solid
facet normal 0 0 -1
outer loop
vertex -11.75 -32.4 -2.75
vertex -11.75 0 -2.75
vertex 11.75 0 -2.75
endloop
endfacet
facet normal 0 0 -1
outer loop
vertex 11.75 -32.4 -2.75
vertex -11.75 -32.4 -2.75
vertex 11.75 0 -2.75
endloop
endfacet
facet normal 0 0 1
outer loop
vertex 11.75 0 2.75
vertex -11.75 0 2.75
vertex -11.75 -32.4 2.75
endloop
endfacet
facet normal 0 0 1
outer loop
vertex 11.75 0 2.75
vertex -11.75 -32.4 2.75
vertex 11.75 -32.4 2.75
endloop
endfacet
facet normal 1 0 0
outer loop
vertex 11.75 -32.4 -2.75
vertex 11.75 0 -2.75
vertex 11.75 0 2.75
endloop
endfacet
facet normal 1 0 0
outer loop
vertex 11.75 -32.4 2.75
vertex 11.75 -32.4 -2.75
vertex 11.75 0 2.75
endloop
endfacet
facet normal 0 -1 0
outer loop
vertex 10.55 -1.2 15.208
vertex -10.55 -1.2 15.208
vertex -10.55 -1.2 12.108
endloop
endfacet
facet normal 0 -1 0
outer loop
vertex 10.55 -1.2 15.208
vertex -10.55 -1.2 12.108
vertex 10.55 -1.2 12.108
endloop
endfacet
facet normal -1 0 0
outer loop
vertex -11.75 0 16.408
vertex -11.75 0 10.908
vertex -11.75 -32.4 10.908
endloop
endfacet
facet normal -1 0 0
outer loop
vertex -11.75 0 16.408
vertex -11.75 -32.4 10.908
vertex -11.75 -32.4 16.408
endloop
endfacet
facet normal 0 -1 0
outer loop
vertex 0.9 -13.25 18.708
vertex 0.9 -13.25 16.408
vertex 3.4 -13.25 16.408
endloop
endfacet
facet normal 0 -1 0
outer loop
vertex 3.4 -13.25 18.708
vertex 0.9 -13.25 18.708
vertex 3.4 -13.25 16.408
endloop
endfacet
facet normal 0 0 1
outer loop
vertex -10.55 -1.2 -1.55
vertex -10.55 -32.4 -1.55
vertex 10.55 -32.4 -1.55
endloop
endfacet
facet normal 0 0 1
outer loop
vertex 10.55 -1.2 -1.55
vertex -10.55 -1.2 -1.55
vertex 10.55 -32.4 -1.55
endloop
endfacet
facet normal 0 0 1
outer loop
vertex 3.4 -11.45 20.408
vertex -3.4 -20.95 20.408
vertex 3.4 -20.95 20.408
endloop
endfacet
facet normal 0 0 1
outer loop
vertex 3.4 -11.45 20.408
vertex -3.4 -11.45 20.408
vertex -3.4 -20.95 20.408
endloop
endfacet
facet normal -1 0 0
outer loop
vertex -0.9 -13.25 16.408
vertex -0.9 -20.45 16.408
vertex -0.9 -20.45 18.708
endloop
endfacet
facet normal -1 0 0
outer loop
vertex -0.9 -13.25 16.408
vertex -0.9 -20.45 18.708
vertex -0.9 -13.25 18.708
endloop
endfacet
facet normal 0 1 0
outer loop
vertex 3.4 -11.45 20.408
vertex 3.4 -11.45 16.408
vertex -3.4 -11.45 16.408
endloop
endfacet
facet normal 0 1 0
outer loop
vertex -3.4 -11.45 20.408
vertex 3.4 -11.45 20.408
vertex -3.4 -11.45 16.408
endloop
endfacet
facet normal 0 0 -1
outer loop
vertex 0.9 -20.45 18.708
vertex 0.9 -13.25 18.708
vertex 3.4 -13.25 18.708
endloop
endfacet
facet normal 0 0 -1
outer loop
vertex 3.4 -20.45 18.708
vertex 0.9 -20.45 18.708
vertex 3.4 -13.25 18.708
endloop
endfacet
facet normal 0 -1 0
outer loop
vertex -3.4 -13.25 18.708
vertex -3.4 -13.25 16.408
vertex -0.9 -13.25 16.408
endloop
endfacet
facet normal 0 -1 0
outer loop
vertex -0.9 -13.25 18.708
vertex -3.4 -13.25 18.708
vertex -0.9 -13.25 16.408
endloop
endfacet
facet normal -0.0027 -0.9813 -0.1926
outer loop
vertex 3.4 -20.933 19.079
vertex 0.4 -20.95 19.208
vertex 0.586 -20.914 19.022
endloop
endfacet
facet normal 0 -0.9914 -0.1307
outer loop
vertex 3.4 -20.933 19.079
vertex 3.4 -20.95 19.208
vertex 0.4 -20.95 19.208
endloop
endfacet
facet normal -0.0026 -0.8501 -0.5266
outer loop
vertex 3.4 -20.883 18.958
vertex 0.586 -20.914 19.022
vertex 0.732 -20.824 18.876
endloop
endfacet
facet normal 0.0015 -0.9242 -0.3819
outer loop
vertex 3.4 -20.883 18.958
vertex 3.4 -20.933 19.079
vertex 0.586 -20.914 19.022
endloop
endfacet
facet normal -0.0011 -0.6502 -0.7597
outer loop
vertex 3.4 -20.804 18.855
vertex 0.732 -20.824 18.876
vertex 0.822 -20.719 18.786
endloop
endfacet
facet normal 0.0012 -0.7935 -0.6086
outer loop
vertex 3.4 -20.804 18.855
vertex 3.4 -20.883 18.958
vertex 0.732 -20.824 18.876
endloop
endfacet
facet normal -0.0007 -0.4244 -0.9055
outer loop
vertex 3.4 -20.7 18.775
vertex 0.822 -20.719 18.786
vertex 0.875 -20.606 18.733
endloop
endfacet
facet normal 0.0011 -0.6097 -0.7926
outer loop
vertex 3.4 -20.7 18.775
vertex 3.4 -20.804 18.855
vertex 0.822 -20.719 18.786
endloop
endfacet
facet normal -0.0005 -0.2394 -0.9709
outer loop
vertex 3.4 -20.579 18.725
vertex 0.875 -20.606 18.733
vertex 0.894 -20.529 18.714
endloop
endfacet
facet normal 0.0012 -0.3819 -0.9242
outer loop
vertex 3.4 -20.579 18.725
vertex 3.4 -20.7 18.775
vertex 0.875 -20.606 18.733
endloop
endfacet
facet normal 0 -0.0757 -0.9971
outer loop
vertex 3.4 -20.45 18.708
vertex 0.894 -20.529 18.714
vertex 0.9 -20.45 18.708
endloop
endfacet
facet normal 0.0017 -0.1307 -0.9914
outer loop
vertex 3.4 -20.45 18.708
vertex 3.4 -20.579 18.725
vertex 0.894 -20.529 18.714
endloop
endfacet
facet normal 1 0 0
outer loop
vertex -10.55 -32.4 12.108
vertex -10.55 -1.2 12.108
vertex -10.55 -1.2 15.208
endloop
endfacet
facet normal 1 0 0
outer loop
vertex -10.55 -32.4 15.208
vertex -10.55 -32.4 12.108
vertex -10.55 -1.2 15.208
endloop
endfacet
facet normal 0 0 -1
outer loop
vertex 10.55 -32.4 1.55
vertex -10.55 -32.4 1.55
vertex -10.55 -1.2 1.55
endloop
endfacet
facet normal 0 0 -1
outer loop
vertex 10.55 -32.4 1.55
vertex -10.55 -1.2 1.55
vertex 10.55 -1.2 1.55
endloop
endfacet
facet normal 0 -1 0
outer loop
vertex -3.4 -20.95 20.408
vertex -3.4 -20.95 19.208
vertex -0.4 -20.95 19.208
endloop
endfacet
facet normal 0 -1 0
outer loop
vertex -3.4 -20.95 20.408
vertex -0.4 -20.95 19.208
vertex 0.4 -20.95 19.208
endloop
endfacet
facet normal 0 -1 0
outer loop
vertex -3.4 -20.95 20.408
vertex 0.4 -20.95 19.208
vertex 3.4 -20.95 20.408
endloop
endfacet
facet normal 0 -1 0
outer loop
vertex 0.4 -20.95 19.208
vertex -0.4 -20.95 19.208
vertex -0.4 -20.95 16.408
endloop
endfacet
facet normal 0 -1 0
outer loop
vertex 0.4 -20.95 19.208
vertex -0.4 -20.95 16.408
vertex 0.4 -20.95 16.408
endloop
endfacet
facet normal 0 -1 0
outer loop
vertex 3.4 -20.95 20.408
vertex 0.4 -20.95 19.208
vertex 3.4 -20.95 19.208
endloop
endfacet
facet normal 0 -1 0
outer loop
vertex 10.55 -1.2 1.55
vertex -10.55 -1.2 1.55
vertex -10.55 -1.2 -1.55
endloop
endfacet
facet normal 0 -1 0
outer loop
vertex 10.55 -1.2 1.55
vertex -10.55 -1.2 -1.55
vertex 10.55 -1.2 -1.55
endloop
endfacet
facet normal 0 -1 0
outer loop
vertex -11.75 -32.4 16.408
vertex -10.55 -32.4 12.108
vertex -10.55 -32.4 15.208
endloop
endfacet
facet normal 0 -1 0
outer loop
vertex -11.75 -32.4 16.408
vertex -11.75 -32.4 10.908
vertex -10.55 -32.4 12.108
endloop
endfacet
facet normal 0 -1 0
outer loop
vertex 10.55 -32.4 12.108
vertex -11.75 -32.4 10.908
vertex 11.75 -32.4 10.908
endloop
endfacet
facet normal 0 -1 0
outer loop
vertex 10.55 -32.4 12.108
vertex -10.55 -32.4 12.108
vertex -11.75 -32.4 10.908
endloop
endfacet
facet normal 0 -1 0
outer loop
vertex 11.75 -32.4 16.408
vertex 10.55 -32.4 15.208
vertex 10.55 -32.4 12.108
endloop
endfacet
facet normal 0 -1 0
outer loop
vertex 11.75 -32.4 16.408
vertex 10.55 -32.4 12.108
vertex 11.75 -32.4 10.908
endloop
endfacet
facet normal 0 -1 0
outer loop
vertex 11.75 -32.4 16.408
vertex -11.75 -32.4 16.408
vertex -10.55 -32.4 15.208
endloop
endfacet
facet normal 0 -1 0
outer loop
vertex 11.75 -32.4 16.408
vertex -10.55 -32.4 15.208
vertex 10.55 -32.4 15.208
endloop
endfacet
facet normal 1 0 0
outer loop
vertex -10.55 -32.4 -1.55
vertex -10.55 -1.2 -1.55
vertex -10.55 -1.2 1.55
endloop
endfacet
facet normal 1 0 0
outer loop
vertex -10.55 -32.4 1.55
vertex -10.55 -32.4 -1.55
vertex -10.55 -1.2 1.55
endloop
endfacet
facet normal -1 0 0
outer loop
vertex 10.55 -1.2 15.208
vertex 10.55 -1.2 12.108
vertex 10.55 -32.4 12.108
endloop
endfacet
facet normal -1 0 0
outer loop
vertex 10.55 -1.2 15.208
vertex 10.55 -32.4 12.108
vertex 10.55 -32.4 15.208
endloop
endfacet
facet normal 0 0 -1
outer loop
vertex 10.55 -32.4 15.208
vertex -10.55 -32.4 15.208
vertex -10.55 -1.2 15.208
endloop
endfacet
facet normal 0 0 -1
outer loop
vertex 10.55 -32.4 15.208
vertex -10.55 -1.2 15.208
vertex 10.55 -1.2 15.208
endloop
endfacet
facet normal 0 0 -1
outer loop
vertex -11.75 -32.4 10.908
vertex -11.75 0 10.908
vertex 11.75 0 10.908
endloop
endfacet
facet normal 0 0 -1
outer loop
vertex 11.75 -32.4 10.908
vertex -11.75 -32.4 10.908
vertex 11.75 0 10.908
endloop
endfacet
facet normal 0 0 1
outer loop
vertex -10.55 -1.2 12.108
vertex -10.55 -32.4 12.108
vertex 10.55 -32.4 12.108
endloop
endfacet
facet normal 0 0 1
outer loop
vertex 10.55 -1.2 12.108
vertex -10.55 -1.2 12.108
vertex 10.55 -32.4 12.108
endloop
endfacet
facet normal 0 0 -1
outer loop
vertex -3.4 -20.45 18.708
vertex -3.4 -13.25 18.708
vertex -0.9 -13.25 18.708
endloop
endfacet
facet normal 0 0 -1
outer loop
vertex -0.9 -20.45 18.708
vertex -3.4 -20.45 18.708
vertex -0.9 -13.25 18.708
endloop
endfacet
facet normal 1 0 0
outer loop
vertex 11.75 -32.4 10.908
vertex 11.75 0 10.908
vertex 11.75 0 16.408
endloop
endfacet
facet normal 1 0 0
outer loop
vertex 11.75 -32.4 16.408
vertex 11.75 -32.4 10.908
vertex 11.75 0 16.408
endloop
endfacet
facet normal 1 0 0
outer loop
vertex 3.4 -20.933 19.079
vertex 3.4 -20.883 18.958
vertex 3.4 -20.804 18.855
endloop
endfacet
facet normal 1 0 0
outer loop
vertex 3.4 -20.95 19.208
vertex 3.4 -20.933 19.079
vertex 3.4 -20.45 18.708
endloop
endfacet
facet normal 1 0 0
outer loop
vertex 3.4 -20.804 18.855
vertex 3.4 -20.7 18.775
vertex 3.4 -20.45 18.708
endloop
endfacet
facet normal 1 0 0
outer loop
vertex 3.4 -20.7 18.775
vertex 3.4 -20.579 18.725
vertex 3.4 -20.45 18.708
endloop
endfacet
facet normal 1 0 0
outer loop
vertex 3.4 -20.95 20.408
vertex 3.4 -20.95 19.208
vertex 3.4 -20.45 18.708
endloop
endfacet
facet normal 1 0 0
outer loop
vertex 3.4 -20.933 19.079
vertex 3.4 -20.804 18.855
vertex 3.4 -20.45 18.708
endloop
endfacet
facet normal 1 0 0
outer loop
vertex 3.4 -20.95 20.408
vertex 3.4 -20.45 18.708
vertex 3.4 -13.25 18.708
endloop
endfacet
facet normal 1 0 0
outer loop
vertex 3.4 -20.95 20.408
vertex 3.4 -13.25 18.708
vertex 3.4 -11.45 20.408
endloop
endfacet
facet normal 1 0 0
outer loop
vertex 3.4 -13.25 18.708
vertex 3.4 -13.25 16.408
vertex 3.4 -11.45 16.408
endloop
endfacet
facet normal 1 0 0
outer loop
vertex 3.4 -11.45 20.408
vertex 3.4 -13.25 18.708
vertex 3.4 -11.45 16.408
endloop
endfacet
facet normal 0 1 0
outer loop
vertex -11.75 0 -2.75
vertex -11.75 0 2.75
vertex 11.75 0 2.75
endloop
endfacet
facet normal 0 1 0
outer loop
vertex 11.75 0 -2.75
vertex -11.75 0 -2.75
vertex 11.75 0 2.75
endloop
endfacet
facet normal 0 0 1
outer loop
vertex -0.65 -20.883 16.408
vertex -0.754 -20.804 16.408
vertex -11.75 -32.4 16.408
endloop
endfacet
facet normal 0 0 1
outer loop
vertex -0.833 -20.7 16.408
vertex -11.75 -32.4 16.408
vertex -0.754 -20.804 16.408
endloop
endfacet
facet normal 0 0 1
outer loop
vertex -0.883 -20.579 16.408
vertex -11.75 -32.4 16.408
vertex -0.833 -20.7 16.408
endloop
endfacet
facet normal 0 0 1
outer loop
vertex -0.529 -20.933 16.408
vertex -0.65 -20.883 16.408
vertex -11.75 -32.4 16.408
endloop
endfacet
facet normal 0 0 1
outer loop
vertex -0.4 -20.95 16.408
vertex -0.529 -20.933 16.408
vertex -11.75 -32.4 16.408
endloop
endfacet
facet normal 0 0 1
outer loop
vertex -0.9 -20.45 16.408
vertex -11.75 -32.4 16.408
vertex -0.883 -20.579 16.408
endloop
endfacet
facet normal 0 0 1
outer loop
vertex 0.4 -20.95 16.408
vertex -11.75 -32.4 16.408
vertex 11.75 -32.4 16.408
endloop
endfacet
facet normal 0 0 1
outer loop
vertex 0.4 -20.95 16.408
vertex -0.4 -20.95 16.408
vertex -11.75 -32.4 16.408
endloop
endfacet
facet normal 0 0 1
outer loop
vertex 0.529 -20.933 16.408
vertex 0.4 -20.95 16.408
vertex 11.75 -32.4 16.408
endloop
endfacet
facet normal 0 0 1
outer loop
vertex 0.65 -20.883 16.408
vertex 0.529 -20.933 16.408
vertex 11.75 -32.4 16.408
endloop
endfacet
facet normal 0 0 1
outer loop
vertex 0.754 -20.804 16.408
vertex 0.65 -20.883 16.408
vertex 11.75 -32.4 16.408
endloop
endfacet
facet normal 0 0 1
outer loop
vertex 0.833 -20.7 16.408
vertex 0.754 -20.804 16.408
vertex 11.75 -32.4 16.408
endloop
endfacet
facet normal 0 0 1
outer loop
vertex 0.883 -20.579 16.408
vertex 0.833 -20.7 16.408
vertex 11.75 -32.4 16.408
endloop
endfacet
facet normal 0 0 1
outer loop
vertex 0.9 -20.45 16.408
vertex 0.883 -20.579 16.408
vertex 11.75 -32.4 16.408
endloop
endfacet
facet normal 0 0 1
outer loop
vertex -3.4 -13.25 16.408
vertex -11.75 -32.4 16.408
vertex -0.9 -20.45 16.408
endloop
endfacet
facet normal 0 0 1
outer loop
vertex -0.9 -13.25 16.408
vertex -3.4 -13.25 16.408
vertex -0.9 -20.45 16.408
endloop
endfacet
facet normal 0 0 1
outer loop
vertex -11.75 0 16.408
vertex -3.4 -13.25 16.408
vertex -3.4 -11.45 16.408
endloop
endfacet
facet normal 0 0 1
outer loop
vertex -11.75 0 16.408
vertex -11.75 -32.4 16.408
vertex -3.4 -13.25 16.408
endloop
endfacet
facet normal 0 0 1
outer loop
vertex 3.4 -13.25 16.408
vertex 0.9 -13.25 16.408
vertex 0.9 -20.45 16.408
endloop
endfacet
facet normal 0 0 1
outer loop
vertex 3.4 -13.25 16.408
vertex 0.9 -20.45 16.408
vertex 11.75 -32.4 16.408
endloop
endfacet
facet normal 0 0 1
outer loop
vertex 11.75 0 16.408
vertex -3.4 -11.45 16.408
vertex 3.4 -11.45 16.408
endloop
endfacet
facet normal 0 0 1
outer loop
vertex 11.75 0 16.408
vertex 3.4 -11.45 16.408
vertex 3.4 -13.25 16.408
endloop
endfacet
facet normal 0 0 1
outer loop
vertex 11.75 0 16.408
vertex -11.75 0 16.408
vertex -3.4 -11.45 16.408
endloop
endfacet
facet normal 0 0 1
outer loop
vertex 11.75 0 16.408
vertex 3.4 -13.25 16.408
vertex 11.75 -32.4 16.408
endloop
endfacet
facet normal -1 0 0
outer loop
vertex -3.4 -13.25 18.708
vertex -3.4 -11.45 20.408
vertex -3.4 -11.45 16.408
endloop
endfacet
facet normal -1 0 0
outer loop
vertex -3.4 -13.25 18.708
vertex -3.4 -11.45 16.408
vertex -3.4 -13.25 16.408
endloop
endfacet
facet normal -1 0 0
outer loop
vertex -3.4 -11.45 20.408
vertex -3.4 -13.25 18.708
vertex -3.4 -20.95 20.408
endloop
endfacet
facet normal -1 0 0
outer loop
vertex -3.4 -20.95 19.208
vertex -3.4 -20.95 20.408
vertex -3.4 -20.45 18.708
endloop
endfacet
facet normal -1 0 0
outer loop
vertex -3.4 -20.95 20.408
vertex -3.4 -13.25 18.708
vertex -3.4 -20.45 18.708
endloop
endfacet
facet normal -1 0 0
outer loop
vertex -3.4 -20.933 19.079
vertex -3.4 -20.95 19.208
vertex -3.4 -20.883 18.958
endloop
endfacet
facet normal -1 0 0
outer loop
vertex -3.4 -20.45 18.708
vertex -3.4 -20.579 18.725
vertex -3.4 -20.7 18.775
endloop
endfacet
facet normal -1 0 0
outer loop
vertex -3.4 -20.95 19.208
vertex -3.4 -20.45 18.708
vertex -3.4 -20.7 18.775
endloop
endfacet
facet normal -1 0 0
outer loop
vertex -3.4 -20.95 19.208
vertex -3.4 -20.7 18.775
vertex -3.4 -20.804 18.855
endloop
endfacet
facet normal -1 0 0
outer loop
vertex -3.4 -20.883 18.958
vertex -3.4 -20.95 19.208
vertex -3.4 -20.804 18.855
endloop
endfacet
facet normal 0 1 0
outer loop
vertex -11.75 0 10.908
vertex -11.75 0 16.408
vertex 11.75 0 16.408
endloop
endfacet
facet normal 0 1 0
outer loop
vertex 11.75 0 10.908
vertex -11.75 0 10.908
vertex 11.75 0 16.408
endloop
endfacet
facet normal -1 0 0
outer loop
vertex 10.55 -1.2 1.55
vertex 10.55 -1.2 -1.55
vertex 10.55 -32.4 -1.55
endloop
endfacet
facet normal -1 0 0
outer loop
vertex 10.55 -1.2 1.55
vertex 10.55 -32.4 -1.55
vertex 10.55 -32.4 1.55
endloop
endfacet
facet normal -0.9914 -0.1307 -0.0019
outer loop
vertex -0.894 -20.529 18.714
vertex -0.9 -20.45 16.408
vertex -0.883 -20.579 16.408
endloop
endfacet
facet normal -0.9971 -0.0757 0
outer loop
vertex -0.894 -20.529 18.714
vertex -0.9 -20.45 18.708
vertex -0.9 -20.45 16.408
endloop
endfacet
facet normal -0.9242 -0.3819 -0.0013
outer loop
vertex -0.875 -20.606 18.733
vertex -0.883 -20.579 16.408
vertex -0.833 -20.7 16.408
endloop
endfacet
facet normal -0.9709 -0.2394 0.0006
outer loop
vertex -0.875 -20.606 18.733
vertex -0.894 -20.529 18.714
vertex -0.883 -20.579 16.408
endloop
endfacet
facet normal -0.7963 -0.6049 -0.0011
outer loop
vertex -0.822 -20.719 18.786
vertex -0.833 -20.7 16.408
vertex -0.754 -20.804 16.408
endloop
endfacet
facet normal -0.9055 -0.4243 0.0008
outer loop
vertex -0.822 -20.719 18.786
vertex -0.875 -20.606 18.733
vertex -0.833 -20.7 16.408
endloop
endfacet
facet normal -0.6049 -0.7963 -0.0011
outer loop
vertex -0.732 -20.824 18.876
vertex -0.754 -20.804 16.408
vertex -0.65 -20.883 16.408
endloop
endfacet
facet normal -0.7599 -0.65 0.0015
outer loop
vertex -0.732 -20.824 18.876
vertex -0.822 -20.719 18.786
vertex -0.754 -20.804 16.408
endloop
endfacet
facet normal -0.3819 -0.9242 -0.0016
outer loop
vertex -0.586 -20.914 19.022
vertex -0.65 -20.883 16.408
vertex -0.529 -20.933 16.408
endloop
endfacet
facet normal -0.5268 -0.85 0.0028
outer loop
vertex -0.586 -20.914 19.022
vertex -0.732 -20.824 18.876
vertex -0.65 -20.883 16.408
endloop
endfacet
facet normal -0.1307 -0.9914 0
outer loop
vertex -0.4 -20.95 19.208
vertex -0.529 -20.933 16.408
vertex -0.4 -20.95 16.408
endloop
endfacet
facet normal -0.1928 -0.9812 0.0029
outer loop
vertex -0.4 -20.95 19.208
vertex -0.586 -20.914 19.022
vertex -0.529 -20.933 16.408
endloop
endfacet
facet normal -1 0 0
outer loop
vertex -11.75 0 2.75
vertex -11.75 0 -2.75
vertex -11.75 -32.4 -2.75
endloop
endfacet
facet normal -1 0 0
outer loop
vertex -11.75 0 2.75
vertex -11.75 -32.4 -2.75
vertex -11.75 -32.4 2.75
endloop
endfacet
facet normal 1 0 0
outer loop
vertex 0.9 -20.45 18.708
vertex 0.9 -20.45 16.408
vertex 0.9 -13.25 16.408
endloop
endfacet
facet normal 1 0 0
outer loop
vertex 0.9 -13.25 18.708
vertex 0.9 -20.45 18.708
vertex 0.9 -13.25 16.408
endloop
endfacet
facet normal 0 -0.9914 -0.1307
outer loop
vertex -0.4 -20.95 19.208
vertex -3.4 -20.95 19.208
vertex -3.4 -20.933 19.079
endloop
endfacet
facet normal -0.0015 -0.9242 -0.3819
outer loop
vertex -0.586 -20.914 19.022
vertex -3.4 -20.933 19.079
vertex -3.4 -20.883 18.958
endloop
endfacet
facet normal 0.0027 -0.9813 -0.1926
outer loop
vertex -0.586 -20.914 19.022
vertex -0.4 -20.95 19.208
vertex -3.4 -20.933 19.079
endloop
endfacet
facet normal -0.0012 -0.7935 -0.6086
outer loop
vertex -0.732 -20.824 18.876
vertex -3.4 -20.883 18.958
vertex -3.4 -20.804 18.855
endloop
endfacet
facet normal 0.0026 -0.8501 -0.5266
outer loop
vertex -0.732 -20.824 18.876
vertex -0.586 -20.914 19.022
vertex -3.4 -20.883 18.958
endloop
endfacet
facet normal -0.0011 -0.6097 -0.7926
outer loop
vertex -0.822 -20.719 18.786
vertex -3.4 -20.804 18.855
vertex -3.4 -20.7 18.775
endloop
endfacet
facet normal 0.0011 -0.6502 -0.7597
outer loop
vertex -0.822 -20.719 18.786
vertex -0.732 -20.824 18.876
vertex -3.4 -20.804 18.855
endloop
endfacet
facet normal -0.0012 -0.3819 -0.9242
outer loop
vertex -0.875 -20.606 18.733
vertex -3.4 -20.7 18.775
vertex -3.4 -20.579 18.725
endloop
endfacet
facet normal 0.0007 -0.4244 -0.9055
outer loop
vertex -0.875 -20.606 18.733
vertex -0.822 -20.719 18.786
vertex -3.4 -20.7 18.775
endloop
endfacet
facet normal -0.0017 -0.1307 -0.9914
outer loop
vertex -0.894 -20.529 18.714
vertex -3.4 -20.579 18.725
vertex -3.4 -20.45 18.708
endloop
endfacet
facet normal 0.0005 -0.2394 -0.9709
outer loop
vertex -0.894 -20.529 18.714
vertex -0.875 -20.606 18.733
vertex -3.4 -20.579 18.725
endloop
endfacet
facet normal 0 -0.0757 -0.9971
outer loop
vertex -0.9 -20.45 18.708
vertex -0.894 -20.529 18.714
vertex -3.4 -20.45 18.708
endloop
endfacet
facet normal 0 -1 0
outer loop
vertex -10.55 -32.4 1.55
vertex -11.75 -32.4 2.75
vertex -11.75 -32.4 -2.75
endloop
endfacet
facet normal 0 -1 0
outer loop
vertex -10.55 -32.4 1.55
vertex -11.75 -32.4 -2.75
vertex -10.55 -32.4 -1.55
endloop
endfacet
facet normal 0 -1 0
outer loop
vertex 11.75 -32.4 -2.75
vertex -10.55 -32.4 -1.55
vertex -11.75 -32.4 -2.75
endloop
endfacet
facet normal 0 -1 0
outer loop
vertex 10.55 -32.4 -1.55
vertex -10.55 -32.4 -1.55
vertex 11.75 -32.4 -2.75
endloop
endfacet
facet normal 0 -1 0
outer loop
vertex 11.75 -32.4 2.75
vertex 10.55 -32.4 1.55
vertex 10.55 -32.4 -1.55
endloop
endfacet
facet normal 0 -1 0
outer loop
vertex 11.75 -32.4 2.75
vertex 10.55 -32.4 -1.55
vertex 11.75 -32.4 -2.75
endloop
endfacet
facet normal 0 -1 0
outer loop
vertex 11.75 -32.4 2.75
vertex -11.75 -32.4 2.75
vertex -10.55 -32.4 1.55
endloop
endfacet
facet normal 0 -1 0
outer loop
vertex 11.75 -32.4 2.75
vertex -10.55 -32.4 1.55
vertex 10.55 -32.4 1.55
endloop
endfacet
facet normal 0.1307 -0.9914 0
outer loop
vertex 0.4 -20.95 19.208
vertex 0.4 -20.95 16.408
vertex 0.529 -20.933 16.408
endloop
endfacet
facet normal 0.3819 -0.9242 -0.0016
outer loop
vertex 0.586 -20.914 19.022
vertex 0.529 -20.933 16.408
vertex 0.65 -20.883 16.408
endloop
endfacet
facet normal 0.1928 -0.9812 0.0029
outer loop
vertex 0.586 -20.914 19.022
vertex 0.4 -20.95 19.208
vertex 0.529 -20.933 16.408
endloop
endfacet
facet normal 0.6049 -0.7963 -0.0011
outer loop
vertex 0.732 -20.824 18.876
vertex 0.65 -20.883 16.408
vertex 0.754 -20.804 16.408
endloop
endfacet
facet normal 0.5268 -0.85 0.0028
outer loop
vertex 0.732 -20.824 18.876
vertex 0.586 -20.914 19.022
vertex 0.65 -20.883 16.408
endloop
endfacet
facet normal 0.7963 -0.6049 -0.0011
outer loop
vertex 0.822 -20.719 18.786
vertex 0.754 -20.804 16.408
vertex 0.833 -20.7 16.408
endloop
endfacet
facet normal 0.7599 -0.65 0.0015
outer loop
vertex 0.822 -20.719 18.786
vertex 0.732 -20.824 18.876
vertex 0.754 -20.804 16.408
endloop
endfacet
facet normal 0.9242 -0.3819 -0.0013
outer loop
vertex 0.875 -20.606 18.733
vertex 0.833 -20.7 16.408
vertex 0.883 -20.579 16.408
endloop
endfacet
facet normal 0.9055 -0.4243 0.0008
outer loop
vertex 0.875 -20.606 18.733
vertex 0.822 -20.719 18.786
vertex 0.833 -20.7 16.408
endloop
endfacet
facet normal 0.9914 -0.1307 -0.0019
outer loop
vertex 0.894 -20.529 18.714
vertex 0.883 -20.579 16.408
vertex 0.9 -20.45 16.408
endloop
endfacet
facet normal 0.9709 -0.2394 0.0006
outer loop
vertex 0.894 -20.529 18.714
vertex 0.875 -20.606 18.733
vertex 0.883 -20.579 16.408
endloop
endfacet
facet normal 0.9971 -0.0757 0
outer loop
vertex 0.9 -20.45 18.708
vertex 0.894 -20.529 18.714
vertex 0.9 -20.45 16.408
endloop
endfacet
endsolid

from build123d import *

# Parameters (mm, degrees)
F1_W     = 23.5
F1_H     = 5.5
F1_W_2   = 21.1
F1_H_2   = 3.1
F2_DEPTH = 32.4
F3_DEPTH = 1.2
F4_W     = 21.1
F4_H     = 3.1
F5_DEPTH = 1.2
F4_W_2   = 23.5
F4_H_2   = 5.5
F6_DEPTH = 32.4
F8_START = 2.3
F7_W     = 2.5
F7_H     = 7.7
F8_DEPTH = 1.7
F7_W_2   = 1.8
F9_DEPTH = 4
F10_R    = 0.5


with BuildPart() as f2:
    # F1 (on Front) → F2 (new body)
    with BuildSketch(Plane.XZ):
        Rectangle(F1_W, F1_H)
        Rectangle(F1_W_2, F1_H_2, mode=Mode.SUBTRACT)
    extrude(amount=F2_DEPTH)

    # F1 (on Front) → F3 (join)
    with BuildSketch(Plane.XZ):
        Rectangle(F1_W_2, F1_H_2)
    extrude(amount=F3_DEPTH)


with BuildPart() as f5:
    # F4 (on Front) → F5 (new body)
    with BuildSketch(Plane.XZ):
        with Locations((0, 13.6580683127)):
            Rectangle(F4_W, F4_H)
    extrude(amount=F5_DEPTH)

    # F4 (on Front) → F6 (join, through all)
    with BuildSketch(Plane.XZ):
        with Locations((0, 13.6580683127)):
            Rectangle(F4_W_2, F4_H_2)
        with Locations((0, 13.6580683127)):
            Rectangle(F4_W, F4_H, mode=Mode.SUBTRACT)
    extrude(amount=F6_DEPTH)



with BuildPart() as f8:
    # F7 (on face) → F8 (new body)
    with BuildSketch(Plane.XY.offset(16.4080683127).offset(F8_START)):
        with Locations((2.15, -17.1)):
            Rectangle(F7_W, F7_H)
    extrude(amount=F8_DEPTH)


with BuildPart() as f8b:
    # F7 (on face) → F8, piece 2 (new body)
    with BuildSketch(Plane.XY.offset(16.4080683127).offset(F8_START)):
        with Locations((-2.15, -17.1)):
            Rectangle(F7_W, F7_H)
    extrude(amount=F8_DEPTH)


with BuildPart() as f5_1:
    add(f5.part)

    add(f8.part)  # F9 merges F8

    add(f8b.part)  # F9 merges F8b
    # F7 (on face) → F9 (join)
    with BuildSketch(Plane.XY.offset(16.4080683127)):
        with Locations((0, -17.1)):
            Rectangle(F7_W_2, F7_H)
        Polygon((-3.4, -11.45), (-3.4, -13.25), (-0.9, -13.25), (0.9, -13.25), (3.4, -13.25), (3.4, -11.45), align=None)
    extrude(amount=F9_DEPTH)

    # F10
    f10_edges = [f5_1.edges().sort_by_distance(p)[0] for p in [
        (-2.15, -20.95, 18.708068),
        (2.15, -20.95, 18.708068),
        (0.9, -20.95, 17.558068),
        (-0.9, -20.95, 17.558068),
    ]]
    fillet(f10_edges, radius=F10_R)


solid = Compound([f2.part, f5_1.part])
